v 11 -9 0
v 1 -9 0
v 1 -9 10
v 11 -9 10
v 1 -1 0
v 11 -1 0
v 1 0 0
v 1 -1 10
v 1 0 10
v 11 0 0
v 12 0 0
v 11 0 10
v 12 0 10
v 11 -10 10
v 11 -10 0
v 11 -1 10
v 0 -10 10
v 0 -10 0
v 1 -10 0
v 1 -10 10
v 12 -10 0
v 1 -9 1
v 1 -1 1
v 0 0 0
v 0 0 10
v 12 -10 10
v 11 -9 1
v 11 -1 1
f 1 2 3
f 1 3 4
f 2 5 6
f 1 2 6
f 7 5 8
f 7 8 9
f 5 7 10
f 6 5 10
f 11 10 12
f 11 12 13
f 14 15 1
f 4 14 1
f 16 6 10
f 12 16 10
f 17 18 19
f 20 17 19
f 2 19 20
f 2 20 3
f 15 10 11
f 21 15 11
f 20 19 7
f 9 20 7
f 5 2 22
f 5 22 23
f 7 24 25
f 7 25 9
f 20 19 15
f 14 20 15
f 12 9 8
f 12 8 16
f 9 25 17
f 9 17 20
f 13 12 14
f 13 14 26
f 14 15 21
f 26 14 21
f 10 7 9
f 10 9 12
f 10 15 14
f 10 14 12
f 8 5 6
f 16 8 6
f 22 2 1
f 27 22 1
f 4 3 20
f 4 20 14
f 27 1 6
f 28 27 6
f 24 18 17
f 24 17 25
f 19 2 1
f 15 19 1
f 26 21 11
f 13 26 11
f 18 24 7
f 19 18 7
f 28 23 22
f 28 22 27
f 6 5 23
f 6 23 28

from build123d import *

# Parameters (mm, degrees)
F0_W     = 1
F0_H     = 10
F1_DEPTH = 10
F2_W     = 10
F2_H     = 1
F3_DEPTH = 10
F4_W     = 10
F4_H     = 1
F5_DEPTH = 10
F6_W     = 1
F6_H     = 10
F7_DEPTH = 10
F8_W     = 10
F8_H     = 8
F9_DEPTH = 1


with BuildPart() as f1:
    # F0 (on Top) → F1 (new body)
    with BuildSketch(Plane.XY):
        with Locations((0.5, -5)):
            Rectangle(F0_W, F0_H)
    extrude(amount=F1_DEPTH)


with BuildPart() as f3:
    # F2 (on Top) → F3 (new body)
    with BuildSketch(Plane.XY):
        with Locations((6, -9.5)):
            Rectangle(F2_W, F2_H)
    extrude(amount=F3_DEPTH)


with BuildPart() as f5:
    # F4 (on Top) → F5 (new body)
    with BuildSketch(Plane.XY):
        with Locations((6, -0.5)):
            Rectangle(F4_W, F4_H)
    extrude(amount=F5_DEPTH)


with BuildPart() as f7:
    # F6 (on Top) → F7 (new body)
    with BuildSketch(Plane.XY):
        with Locations((11.5, -5)):
            Rectangle(F6_W, F6_H)
    extrude(amount=F7_DEPTH)


with BuildPart() as f9:
    # F8 (on Top) → F9 (new body)
    with BuildSketch(Plane.XY):
        with Locations((6, -5)):
            Rectangle(F8_W, F8_H)
    extrude(amount=F9_DEPTH)


solid = Compound([f1.part, f3.part, f5.part, f7.part, f9.part])
